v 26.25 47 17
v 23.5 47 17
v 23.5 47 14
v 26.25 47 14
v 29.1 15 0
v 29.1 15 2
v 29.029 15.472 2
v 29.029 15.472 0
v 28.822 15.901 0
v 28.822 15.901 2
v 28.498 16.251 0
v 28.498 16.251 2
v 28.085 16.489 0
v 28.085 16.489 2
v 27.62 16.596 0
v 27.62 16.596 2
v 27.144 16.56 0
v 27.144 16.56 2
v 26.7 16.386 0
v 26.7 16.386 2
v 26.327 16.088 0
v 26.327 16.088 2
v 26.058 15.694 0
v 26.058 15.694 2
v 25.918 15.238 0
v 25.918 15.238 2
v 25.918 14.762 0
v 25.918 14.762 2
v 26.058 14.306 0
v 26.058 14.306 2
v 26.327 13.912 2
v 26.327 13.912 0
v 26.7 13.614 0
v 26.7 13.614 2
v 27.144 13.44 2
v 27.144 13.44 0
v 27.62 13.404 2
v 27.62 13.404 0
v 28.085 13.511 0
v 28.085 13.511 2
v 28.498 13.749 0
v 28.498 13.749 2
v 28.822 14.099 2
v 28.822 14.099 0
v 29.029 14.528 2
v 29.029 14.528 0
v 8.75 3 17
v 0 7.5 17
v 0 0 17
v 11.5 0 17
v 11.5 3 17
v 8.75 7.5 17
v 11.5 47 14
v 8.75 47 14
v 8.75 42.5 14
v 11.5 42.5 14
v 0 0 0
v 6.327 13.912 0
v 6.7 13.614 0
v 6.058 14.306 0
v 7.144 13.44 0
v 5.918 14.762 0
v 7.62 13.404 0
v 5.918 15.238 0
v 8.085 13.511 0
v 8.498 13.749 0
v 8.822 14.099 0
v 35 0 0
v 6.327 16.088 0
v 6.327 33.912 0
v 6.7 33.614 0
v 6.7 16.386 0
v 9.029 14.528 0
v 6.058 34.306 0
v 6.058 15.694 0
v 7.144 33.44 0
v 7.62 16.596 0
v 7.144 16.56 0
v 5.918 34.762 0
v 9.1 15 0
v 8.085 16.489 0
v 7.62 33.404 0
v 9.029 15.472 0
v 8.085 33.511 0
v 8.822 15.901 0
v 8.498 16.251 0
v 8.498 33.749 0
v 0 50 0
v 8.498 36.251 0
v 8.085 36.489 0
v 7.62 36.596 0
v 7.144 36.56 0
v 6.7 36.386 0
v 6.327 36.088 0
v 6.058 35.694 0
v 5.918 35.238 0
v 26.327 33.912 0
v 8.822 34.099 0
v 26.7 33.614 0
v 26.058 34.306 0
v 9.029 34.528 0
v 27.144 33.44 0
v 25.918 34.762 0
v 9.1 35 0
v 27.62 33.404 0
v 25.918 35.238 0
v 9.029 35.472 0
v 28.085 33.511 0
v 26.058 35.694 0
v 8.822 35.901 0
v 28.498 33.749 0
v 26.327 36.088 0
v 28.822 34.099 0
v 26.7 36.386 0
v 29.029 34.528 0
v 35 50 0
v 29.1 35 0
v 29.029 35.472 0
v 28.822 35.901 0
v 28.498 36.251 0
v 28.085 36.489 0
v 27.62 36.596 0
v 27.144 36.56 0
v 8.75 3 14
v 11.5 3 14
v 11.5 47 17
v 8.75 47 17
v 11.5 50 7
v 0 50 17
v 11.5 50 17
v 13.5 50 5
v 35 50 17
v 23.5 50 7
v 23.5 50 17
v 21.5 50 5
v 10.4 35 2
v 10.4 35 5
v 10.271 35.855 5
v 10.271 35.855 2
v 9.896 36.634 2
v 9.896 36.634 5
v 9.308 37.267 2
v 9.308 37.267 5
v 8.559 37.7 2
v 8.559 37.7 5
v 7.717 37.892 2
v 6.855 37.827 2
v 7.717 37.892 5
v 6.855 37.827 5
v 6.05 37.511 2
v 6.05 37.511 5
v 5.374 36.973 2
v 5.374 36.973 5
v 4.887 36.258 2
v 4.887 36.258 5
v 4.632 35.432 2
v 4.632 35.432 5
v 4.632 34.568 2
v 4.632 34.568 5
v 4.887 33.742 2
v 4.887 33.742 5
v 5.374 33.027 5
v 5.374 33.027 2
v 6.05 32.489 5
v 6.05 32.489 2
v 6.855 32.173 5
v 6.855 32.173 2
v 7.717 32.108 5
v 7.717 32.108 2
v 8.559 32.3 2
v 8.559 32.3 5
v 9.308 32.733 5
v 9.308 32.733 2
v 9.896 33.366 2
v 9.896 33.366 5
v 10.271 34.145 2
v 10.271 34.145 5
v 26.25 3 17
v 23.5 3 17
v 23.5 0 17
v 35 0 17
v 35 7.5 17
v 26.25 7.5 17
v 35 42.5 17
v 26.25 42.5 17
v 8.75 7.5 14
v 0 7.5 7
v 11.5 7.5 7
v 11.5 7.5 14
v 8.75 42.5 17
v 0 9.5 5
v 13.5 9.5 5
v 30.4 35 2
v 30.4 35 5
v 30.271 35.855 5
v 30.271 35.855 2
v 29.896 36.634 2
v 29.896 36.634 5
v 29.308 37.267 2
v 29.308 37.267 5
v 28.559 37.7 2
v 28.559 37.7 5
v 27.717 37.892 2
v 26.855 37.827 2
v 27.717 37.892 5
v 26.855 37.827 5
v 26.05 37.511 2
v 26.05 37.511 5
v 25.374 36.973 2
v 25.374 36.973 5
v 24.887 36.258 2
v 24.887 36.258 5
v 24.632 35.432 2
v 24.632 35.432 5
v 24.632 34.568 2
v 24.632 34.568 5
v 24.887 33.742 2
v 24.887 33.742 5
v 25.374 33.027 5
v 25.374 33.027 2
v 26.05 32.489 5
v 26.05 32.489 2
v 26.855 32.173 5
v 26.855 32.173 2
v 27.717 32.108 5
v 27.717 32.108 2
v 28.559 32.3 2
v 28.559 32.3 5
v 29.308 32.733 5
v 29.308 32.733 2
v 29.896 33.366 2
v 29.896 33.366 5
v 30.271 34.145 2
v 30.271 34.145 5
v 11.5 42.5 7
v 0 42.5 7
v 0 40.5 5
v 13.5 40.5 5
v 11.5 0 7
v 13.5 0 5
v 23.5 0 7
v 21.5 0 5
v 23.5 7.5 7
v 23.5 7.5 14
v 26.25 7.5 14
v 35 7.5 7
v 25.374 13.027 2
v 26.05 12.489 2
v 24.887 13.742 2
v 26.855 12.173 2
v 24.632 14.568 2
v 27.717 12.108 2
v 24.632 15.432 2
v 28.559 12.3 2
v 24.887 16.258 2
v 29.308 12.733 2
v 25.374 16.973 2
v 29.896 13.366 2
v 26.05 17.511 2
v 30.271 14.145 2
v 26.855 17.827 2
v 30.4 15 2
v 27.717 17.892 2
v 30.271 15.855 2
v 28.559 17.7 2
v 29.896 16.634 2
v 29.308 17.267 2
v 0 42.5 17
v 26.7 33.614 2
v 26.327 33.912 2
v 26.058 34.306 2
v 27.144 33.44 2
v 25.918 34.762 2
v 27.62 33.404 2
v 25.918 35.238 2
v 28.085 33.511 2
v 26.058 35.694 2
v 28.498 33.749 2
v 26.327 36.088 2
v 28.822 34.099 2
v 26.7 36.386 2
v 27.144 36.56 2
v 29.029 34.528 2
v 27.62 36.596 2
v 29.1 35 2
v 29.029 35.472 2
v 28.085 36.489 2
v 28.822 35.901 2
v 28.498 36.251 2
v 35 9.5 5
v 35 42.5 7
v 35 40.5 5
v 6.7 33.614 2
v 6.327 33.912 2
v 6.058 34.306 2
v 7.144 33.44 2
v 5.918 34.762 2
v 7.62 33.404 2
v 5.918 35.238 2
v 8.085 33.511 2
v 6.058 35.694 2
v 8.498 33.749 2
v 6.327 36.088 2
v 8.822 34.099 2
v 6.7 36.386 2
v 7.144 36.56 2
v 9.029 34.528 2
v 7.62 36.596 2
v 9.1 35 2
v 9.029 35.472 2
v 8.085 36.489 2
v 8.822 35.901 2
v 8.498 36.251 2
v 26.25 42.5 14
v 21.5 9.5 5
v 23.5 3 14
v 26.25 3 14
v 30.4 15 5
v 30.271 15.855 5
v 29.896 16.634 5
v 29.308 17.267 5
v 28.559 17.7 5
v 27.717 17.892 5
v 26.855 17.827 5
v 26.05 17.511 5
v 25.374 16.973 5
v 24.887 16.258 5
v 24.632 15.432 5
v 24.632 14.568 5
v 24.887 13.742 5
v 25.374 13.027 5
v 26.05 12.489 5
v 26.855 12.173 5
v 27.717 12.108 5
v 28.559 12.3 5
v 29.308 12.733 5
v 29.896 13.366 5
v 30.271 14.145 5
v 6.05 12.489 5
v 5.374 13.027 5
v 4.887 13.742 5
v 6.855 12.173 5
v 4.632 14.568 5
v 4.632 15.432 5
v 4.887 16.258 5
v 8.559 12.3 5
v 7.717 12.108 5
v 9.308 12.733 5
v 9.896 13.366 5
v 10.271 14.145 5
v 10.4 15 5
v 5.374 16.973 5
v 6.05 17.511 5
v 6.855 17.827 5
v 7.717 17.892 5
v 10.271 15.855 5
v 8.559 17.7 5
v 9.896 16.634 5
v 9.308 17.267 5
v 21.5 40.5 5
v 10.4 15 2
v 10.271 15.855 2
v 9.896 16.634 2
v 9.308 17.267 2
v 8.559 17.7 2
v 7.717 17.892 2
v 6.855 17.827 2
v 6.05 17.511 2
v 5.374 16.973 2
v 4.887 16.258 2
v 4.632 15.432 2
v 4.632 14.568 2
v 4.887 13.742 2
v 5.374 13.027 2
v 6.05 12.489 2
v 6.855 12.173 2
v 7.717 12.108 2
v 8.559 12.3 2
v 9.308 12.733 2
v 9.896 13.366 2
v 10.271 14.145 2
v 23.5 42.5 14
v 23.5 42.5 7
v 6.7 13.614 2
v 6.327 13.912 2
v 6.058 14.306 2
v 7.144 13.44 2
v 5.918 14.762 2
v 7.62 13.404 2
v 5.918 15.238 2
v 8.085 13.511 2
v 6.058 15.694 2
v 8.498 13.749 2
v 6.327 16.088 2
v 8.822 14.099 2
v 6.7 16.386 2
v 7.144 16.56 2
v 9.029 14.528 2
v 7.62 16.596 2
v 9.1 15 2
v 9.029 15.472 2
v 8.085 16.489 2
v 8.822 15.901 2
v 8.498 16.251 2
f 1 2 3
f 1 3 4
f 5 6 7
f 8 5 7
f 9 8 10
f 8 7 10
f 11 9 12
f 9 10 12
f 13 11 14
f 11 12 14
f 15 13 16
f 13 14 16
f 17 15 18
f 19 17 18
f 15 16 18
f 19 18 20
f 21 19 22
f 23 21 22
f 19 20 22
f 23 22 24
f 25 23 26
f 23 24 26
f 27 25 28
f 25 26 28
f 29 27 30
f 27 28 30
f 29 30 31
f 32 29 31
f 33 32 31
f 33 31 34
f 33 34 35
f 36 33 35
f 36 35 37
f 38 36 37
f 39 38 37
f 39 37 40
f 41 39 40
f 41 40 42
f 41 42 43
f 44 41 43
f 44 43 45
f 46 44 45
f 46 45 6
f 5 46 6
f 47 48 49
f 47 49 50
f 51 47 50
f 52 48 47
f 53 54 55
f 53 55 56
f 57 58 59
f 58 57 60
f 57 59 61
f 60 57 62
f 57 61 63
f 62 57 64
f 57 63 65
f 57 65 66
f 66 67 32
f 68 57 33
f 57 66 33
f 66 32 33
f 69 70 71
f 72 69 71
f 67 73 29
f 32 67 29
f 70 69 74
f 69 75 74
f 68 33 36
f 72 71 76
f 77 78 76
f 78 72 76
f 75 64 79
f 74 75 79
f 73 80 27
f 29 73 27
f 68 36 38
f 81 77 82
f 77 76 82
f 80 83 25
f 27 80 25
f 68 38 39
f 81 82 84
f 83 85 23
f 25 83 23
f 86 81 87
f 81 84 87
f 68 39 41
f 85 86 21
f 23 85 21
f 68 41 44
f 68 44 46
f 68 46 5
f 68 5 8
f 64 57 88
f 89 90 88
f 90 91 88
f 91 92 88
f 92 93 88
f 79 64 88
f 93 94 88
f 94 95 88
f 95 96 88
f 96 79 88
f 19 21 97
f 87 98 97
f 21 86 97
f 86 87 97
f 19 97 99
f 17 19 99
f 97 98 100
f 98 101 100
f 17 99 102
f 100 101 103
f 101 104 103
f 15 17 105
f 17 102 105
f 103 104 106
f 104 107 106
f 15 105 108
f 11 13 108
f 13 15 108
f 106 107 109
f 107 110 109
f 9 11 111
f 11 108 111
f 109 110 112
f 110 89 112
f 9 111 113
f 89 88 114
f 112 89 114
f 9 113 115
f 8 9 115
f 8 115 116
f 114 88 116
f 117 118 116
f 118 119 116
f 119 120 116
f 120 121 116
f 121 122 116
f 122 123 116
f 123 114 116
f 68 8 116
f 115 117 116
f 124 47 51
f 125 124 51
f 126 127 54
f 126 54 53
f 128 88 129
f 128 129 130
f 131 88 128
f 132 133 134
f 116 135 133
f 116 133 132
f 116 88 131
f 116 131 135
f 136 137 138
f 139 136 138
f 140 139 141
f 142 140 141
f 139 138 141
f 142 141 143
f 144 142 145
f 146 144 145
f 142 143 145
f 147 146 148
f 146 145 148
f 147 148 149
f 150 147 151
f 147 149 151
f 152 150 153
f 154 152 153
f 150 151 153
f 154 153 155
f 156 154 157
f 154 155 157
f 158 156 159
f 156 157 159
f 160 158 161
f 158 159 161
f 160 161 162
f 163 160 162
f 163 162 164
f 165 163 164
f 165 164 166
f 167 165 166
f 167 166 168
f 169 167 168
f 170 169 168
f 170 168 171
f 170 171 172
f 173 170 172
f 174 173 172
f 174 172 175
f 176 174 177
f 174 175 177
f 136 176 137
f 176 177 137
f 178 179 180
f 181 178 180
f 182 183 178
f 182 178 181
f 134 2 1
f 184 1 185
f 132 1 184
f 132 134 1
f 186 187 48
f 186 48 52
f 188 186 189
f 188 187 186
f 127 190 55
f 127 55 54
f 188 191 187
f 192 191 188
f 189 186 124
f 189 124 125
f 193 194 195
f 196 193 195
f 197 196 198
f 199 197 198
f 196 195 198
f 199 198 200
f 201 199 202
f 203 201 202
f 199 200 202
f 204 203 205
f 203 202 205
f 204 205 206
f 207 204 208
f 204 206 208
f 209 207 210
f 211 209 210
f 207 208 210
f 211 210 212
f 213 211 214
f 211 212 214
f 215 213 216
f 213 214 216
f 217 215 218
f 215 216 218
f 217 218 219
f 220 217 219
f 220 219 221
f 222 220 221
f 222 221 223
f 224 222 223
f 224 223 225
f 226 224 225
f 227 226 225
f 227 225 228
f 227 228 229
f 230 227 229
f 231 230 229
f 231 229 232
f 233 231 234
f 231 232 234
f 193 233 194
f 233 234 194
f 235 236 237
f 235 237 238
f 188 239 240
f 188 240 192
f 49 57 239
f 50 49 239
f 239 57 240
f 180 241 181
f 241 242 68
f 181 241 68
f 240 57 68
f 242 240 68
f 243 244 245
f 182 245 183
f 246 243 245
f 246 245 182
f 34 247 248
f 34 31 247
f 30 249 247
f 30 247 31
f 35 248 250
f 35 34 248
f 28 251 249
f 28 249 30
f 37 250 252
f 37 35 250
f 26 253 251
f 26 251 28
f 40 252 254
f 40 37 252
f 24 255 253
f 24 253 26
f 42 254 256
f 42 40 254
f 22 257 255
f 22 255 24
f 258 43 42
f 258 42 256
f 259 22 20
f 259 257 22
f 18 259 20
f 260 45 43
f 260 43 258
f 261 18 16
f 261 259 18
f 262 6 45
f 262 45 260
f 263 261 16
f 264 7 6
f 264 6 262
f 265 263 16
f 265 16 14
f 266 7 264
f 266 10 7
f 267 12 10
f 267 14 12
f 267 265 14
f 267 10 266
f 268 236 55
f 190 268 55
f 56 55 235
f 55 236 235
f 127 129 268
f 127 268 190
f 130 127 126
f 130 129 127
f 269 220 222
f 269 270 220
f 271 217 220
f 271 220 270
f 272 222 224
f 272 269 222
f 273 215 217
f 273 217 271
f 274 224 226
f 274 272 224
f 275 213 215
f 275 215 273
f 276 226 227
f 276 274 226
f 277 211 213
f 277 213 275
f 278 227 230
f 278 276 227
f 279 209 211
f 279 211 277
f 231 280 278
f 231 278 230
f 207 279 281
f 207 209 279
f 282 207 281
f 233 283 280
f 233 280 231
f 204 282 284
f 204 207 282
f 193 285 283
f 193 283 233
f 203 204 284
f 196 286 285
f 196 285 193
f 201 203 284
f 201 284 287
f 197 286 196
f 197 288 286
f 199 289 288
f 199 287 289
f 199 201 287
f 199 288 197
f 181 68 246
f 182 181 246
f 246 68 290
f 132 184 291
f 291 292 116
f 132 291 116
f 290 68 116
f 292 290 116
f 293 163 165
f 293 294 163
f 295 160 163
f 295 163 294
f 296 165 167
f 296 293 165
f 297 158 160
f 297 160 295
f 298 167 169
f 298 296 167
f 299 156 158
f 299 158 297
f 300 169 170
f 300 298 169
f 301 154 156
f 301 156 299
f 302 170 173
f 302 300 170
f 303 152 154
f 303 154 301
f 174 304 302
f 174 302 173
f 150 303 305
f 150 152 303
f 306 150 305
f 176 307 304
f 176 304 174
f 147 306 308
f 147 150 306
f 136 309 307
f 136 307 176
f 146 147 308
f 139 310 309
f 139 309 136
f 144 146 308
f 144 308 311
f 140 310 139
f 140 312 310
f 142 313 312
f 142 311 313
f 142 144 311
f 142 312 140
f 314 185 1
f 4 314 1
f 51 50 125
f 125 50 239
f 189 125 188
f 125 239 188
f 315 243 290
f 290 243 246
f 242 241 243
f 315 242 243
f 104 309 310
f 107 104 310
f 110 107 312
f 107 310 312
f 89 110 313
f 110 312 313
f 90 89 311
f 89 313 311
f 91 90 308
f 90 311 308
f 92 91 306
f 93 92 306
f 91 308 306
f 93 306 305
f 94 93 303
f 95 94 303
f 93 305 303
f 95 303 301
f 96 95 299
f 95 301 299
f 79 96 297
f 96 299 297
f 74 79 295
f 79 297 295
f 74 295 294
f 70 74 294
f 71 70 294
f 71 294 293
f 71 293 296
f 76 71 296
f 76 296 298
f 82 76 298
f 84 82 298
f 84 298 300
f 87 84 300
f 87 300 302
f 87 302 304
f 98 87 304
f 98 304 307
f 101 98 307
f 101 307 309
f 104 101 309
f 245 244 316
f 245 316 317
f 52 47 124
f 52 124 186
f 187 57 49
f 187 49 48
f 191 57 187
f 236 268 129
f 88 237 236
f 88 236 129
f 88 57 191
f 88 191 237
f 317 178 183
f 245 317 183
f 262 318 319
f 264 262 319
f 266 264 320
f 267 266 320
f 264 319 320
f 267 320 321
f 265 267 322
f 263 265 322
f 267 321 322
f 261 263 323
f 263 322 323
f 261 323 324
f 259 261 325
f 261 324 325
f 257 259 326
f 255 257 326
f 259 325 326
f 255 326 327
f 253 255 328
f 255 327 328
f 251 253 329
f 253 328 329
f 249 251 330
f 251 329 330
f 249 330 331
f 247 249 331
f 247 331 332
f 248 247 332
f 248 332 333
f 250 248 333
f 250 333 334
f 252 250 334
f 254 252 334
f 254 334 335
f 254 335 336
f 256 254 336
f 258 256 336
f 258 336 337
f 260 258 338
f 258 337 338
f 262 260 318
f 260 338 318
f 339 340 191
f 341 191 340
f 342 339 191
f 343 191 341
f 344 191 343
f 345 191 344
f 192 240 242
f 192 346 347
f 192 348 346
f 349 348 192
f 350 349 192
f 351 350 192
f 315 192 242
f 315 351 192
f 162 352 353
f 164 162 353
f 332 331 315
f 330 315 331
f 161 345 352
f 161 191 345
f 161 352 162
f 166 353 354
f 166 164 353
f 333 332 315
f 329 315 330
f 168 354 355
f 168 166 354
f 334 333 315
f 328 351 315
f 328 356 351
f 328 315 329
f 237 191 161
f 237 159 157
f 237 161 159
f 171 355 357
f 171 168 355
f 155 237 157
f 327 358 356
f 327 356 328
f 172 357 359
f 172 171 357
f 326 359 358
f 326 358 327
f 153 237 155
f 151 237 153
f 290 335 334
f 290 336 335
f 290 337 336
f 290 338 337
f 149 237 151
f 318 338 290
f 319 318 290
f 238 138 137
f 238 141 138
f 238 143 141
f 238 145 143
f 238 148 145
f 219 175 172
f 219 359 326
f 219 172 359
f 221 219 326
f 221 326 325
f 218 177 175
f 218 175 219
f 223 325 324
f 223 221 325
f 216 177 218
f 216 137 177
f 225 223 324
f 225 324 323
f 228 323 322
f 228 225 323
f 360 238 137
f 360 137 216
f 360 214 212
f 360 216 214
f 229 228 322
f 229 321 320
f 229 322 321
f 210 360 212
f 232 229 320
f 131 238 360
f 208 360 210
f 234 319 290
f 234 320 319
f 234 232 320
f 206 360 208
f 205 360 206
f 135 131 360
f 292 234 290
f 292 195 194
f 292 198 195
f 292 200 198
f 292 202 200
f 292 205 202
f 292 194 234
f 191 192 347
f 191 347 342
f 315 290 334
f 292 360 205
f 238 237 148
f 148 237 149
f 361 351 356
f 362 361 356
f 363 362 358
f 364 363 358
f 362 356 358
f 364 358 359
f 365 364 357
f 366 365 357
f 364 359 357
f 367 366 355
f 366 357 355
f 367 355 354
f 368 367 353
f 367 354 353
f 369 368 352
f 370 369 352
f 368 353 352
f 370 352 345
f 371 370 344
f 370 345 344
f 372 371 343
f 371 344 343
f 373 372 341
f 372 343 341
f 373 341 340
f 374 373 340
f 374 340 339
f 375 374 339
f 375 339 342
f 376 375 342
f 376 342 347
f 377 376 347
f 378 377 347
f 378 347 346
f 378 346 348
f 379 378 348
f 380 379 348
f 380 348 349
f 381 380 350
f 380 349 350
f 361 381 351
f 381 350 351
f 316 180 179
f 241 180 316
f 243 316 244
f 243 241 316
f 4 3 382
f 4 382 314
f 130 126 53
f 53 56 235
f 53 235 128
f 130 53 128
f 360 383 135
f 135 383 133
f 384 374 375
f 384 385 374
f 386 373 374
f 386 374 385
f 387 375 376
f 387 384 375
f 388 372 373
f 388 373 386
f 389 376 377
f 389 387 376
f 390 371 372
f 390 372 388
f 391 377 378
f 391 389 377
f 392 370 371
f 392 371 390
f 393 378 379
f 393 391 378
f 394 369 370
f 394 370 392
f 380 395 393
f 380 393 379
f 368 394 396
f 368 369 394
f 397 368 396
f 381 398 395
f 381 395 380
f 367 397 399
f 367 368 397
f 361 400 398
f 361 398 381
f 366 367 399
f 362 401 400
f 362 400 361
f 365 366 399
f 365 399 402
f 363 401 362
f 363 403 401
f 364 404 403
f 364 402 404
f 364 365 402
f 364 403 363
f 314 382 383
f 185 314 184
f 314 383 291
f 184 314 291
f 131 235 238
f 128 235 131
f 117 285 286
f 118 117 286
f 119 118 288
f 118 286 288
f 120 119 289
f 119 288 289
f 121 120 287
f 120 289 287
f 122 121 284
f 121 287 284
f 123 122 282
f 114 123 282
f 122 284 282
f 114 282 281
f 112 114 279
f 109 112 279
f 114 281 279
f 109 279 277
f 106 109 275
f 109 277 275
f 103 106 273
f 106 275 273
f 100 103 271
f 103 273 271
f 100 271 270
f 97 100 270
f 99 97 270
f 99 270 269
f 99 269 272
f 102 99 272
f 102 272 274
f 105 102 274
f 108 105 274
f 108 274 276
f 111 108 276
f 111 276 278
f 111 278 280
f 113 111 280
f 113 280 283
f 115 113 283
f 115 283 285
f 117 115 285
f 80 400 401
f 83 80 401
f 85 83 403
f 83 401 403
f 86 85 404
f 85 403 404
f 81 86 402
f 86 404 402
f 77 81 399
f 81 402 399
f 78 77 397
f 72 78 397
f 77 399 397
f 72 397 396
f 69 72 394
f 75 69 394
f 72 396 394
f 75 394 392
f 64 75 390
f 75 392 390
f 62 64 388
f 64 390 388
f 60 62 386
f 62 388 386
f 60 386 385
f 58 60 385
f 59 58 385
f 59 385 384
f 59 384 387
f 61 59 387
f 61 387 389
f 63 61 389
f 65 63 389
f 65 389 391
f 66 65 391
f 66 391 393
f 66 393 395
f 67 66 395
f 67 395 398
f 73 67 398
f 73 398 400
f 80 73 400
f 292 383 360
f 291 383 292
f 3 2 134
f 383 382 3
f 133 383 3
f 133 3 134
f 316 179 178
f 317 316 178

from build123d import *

# Parameters (mm, degrees)
SKETCH_W        = 35
SKETCH_H        = 50
PAD_DEPTH       = 5
SKETCH004_R     = 2.9
POCKET_DEPTH    = 3
SKETCH005_R     = 1.6
POCKET001_DEPTH = 5
SKETCH006_W     = 11.5
SKETCH006_H     = 7.5
PAD001_DEPTH    = 12
SKETCH007_W     = 17.5
SKETCH007_H     = 44
POCKET002_DEPTH = 3
CHAMFER_SIZE    = 2


with BuildPart() as part:
    # Sketch → Pad (new body)
    with BuildSketch(Plane.XY):
        with Locations((17.5, 25)):
            Rectangle(SKETCH_W, SKETCH_H)
    extrude(amount=PAD_DEPTH)

    # Sketch004 → Pocket (cut)
    with BuildSketch(Plane.XY.offset(5)):
        with Locations((7.5, 15)):
            Circle(SKETCH004_R)
        with Locations((7.5, 35)):
            Circle(SKETCH004_R)
        with Locations((27.5, 15)):
            Circle(SKETCH004_R)
        with Locations((27.5, 35)):
            Circle(SKETCH004_R)
    extrude(amount=-POCKET_DEPTH, mode=Mode.SUBTRACT)

    # Sketch005 → Pocket001 (cut)
    with BuildSketch(Plane.XY.offset(2)):
        with Locations((7.5, 15)):
            Circle(SKETCH005_R)
        with Locations((7.5, 35)):
            Circle(SKETCH005_R)
        with Locations((27.5, 15)):
            Circle(SKETCH005_R)
        with Locations((27.5, 35)):
            Circle(SKETCH005_R)
    extrude(amount=-POCKET001_DEPTH, mode=Mode.SUBTRACT)

    # Sketch006 → Pad001 (new body)
    with BuildSketch(Plane.XY.offset(5)):
        with Locations((5.75, 3.75)):
            Rectangle(SKETCH006_W, SKETCH006_H)
        with Locations((5.75, 46.25)):
            Rectangle(SKETCH006_W, SKETCH006_H)
        with Locations((29.25, 3.75)):
            Rectangle(SKETCH006_W, SKETCH006_H)
        with Locations((29.25, 46.25)):
            Rectangle(SKETCH006_W, SKETCH006_H)
    extrude(amount=PAD001_DEPTH)

    # Sketch007 → Pocket002 (cut)
    with BuildSketch(Plane.XY.offset(17)):
        with Locations((17.5, 25)):
            Rectangle(SKETCH007_W, SKETCH007_H)
    extrude(amount=-POCKET002_DEPTH, mode=Mode.SUBTRACT)

    # Chamfer
    chamfer_edges = [part.edges().sort_by_distance(p)[0] for p in [
        (5.75, 7.5, 5),
        (11.5, 3.75, 5),
        (29.25, 7.5, 5),
        (23.5, 3.75, 5),
        (5.75, 42.5, 5),
        (11.5, 46.25, 5),
        (29.25, 42.5, 5),
        (23.5, 46.25, 5),
    ]]
    chamfer(chamfer_edges, length=CHAMFER_SIZE)


solid = part.part
